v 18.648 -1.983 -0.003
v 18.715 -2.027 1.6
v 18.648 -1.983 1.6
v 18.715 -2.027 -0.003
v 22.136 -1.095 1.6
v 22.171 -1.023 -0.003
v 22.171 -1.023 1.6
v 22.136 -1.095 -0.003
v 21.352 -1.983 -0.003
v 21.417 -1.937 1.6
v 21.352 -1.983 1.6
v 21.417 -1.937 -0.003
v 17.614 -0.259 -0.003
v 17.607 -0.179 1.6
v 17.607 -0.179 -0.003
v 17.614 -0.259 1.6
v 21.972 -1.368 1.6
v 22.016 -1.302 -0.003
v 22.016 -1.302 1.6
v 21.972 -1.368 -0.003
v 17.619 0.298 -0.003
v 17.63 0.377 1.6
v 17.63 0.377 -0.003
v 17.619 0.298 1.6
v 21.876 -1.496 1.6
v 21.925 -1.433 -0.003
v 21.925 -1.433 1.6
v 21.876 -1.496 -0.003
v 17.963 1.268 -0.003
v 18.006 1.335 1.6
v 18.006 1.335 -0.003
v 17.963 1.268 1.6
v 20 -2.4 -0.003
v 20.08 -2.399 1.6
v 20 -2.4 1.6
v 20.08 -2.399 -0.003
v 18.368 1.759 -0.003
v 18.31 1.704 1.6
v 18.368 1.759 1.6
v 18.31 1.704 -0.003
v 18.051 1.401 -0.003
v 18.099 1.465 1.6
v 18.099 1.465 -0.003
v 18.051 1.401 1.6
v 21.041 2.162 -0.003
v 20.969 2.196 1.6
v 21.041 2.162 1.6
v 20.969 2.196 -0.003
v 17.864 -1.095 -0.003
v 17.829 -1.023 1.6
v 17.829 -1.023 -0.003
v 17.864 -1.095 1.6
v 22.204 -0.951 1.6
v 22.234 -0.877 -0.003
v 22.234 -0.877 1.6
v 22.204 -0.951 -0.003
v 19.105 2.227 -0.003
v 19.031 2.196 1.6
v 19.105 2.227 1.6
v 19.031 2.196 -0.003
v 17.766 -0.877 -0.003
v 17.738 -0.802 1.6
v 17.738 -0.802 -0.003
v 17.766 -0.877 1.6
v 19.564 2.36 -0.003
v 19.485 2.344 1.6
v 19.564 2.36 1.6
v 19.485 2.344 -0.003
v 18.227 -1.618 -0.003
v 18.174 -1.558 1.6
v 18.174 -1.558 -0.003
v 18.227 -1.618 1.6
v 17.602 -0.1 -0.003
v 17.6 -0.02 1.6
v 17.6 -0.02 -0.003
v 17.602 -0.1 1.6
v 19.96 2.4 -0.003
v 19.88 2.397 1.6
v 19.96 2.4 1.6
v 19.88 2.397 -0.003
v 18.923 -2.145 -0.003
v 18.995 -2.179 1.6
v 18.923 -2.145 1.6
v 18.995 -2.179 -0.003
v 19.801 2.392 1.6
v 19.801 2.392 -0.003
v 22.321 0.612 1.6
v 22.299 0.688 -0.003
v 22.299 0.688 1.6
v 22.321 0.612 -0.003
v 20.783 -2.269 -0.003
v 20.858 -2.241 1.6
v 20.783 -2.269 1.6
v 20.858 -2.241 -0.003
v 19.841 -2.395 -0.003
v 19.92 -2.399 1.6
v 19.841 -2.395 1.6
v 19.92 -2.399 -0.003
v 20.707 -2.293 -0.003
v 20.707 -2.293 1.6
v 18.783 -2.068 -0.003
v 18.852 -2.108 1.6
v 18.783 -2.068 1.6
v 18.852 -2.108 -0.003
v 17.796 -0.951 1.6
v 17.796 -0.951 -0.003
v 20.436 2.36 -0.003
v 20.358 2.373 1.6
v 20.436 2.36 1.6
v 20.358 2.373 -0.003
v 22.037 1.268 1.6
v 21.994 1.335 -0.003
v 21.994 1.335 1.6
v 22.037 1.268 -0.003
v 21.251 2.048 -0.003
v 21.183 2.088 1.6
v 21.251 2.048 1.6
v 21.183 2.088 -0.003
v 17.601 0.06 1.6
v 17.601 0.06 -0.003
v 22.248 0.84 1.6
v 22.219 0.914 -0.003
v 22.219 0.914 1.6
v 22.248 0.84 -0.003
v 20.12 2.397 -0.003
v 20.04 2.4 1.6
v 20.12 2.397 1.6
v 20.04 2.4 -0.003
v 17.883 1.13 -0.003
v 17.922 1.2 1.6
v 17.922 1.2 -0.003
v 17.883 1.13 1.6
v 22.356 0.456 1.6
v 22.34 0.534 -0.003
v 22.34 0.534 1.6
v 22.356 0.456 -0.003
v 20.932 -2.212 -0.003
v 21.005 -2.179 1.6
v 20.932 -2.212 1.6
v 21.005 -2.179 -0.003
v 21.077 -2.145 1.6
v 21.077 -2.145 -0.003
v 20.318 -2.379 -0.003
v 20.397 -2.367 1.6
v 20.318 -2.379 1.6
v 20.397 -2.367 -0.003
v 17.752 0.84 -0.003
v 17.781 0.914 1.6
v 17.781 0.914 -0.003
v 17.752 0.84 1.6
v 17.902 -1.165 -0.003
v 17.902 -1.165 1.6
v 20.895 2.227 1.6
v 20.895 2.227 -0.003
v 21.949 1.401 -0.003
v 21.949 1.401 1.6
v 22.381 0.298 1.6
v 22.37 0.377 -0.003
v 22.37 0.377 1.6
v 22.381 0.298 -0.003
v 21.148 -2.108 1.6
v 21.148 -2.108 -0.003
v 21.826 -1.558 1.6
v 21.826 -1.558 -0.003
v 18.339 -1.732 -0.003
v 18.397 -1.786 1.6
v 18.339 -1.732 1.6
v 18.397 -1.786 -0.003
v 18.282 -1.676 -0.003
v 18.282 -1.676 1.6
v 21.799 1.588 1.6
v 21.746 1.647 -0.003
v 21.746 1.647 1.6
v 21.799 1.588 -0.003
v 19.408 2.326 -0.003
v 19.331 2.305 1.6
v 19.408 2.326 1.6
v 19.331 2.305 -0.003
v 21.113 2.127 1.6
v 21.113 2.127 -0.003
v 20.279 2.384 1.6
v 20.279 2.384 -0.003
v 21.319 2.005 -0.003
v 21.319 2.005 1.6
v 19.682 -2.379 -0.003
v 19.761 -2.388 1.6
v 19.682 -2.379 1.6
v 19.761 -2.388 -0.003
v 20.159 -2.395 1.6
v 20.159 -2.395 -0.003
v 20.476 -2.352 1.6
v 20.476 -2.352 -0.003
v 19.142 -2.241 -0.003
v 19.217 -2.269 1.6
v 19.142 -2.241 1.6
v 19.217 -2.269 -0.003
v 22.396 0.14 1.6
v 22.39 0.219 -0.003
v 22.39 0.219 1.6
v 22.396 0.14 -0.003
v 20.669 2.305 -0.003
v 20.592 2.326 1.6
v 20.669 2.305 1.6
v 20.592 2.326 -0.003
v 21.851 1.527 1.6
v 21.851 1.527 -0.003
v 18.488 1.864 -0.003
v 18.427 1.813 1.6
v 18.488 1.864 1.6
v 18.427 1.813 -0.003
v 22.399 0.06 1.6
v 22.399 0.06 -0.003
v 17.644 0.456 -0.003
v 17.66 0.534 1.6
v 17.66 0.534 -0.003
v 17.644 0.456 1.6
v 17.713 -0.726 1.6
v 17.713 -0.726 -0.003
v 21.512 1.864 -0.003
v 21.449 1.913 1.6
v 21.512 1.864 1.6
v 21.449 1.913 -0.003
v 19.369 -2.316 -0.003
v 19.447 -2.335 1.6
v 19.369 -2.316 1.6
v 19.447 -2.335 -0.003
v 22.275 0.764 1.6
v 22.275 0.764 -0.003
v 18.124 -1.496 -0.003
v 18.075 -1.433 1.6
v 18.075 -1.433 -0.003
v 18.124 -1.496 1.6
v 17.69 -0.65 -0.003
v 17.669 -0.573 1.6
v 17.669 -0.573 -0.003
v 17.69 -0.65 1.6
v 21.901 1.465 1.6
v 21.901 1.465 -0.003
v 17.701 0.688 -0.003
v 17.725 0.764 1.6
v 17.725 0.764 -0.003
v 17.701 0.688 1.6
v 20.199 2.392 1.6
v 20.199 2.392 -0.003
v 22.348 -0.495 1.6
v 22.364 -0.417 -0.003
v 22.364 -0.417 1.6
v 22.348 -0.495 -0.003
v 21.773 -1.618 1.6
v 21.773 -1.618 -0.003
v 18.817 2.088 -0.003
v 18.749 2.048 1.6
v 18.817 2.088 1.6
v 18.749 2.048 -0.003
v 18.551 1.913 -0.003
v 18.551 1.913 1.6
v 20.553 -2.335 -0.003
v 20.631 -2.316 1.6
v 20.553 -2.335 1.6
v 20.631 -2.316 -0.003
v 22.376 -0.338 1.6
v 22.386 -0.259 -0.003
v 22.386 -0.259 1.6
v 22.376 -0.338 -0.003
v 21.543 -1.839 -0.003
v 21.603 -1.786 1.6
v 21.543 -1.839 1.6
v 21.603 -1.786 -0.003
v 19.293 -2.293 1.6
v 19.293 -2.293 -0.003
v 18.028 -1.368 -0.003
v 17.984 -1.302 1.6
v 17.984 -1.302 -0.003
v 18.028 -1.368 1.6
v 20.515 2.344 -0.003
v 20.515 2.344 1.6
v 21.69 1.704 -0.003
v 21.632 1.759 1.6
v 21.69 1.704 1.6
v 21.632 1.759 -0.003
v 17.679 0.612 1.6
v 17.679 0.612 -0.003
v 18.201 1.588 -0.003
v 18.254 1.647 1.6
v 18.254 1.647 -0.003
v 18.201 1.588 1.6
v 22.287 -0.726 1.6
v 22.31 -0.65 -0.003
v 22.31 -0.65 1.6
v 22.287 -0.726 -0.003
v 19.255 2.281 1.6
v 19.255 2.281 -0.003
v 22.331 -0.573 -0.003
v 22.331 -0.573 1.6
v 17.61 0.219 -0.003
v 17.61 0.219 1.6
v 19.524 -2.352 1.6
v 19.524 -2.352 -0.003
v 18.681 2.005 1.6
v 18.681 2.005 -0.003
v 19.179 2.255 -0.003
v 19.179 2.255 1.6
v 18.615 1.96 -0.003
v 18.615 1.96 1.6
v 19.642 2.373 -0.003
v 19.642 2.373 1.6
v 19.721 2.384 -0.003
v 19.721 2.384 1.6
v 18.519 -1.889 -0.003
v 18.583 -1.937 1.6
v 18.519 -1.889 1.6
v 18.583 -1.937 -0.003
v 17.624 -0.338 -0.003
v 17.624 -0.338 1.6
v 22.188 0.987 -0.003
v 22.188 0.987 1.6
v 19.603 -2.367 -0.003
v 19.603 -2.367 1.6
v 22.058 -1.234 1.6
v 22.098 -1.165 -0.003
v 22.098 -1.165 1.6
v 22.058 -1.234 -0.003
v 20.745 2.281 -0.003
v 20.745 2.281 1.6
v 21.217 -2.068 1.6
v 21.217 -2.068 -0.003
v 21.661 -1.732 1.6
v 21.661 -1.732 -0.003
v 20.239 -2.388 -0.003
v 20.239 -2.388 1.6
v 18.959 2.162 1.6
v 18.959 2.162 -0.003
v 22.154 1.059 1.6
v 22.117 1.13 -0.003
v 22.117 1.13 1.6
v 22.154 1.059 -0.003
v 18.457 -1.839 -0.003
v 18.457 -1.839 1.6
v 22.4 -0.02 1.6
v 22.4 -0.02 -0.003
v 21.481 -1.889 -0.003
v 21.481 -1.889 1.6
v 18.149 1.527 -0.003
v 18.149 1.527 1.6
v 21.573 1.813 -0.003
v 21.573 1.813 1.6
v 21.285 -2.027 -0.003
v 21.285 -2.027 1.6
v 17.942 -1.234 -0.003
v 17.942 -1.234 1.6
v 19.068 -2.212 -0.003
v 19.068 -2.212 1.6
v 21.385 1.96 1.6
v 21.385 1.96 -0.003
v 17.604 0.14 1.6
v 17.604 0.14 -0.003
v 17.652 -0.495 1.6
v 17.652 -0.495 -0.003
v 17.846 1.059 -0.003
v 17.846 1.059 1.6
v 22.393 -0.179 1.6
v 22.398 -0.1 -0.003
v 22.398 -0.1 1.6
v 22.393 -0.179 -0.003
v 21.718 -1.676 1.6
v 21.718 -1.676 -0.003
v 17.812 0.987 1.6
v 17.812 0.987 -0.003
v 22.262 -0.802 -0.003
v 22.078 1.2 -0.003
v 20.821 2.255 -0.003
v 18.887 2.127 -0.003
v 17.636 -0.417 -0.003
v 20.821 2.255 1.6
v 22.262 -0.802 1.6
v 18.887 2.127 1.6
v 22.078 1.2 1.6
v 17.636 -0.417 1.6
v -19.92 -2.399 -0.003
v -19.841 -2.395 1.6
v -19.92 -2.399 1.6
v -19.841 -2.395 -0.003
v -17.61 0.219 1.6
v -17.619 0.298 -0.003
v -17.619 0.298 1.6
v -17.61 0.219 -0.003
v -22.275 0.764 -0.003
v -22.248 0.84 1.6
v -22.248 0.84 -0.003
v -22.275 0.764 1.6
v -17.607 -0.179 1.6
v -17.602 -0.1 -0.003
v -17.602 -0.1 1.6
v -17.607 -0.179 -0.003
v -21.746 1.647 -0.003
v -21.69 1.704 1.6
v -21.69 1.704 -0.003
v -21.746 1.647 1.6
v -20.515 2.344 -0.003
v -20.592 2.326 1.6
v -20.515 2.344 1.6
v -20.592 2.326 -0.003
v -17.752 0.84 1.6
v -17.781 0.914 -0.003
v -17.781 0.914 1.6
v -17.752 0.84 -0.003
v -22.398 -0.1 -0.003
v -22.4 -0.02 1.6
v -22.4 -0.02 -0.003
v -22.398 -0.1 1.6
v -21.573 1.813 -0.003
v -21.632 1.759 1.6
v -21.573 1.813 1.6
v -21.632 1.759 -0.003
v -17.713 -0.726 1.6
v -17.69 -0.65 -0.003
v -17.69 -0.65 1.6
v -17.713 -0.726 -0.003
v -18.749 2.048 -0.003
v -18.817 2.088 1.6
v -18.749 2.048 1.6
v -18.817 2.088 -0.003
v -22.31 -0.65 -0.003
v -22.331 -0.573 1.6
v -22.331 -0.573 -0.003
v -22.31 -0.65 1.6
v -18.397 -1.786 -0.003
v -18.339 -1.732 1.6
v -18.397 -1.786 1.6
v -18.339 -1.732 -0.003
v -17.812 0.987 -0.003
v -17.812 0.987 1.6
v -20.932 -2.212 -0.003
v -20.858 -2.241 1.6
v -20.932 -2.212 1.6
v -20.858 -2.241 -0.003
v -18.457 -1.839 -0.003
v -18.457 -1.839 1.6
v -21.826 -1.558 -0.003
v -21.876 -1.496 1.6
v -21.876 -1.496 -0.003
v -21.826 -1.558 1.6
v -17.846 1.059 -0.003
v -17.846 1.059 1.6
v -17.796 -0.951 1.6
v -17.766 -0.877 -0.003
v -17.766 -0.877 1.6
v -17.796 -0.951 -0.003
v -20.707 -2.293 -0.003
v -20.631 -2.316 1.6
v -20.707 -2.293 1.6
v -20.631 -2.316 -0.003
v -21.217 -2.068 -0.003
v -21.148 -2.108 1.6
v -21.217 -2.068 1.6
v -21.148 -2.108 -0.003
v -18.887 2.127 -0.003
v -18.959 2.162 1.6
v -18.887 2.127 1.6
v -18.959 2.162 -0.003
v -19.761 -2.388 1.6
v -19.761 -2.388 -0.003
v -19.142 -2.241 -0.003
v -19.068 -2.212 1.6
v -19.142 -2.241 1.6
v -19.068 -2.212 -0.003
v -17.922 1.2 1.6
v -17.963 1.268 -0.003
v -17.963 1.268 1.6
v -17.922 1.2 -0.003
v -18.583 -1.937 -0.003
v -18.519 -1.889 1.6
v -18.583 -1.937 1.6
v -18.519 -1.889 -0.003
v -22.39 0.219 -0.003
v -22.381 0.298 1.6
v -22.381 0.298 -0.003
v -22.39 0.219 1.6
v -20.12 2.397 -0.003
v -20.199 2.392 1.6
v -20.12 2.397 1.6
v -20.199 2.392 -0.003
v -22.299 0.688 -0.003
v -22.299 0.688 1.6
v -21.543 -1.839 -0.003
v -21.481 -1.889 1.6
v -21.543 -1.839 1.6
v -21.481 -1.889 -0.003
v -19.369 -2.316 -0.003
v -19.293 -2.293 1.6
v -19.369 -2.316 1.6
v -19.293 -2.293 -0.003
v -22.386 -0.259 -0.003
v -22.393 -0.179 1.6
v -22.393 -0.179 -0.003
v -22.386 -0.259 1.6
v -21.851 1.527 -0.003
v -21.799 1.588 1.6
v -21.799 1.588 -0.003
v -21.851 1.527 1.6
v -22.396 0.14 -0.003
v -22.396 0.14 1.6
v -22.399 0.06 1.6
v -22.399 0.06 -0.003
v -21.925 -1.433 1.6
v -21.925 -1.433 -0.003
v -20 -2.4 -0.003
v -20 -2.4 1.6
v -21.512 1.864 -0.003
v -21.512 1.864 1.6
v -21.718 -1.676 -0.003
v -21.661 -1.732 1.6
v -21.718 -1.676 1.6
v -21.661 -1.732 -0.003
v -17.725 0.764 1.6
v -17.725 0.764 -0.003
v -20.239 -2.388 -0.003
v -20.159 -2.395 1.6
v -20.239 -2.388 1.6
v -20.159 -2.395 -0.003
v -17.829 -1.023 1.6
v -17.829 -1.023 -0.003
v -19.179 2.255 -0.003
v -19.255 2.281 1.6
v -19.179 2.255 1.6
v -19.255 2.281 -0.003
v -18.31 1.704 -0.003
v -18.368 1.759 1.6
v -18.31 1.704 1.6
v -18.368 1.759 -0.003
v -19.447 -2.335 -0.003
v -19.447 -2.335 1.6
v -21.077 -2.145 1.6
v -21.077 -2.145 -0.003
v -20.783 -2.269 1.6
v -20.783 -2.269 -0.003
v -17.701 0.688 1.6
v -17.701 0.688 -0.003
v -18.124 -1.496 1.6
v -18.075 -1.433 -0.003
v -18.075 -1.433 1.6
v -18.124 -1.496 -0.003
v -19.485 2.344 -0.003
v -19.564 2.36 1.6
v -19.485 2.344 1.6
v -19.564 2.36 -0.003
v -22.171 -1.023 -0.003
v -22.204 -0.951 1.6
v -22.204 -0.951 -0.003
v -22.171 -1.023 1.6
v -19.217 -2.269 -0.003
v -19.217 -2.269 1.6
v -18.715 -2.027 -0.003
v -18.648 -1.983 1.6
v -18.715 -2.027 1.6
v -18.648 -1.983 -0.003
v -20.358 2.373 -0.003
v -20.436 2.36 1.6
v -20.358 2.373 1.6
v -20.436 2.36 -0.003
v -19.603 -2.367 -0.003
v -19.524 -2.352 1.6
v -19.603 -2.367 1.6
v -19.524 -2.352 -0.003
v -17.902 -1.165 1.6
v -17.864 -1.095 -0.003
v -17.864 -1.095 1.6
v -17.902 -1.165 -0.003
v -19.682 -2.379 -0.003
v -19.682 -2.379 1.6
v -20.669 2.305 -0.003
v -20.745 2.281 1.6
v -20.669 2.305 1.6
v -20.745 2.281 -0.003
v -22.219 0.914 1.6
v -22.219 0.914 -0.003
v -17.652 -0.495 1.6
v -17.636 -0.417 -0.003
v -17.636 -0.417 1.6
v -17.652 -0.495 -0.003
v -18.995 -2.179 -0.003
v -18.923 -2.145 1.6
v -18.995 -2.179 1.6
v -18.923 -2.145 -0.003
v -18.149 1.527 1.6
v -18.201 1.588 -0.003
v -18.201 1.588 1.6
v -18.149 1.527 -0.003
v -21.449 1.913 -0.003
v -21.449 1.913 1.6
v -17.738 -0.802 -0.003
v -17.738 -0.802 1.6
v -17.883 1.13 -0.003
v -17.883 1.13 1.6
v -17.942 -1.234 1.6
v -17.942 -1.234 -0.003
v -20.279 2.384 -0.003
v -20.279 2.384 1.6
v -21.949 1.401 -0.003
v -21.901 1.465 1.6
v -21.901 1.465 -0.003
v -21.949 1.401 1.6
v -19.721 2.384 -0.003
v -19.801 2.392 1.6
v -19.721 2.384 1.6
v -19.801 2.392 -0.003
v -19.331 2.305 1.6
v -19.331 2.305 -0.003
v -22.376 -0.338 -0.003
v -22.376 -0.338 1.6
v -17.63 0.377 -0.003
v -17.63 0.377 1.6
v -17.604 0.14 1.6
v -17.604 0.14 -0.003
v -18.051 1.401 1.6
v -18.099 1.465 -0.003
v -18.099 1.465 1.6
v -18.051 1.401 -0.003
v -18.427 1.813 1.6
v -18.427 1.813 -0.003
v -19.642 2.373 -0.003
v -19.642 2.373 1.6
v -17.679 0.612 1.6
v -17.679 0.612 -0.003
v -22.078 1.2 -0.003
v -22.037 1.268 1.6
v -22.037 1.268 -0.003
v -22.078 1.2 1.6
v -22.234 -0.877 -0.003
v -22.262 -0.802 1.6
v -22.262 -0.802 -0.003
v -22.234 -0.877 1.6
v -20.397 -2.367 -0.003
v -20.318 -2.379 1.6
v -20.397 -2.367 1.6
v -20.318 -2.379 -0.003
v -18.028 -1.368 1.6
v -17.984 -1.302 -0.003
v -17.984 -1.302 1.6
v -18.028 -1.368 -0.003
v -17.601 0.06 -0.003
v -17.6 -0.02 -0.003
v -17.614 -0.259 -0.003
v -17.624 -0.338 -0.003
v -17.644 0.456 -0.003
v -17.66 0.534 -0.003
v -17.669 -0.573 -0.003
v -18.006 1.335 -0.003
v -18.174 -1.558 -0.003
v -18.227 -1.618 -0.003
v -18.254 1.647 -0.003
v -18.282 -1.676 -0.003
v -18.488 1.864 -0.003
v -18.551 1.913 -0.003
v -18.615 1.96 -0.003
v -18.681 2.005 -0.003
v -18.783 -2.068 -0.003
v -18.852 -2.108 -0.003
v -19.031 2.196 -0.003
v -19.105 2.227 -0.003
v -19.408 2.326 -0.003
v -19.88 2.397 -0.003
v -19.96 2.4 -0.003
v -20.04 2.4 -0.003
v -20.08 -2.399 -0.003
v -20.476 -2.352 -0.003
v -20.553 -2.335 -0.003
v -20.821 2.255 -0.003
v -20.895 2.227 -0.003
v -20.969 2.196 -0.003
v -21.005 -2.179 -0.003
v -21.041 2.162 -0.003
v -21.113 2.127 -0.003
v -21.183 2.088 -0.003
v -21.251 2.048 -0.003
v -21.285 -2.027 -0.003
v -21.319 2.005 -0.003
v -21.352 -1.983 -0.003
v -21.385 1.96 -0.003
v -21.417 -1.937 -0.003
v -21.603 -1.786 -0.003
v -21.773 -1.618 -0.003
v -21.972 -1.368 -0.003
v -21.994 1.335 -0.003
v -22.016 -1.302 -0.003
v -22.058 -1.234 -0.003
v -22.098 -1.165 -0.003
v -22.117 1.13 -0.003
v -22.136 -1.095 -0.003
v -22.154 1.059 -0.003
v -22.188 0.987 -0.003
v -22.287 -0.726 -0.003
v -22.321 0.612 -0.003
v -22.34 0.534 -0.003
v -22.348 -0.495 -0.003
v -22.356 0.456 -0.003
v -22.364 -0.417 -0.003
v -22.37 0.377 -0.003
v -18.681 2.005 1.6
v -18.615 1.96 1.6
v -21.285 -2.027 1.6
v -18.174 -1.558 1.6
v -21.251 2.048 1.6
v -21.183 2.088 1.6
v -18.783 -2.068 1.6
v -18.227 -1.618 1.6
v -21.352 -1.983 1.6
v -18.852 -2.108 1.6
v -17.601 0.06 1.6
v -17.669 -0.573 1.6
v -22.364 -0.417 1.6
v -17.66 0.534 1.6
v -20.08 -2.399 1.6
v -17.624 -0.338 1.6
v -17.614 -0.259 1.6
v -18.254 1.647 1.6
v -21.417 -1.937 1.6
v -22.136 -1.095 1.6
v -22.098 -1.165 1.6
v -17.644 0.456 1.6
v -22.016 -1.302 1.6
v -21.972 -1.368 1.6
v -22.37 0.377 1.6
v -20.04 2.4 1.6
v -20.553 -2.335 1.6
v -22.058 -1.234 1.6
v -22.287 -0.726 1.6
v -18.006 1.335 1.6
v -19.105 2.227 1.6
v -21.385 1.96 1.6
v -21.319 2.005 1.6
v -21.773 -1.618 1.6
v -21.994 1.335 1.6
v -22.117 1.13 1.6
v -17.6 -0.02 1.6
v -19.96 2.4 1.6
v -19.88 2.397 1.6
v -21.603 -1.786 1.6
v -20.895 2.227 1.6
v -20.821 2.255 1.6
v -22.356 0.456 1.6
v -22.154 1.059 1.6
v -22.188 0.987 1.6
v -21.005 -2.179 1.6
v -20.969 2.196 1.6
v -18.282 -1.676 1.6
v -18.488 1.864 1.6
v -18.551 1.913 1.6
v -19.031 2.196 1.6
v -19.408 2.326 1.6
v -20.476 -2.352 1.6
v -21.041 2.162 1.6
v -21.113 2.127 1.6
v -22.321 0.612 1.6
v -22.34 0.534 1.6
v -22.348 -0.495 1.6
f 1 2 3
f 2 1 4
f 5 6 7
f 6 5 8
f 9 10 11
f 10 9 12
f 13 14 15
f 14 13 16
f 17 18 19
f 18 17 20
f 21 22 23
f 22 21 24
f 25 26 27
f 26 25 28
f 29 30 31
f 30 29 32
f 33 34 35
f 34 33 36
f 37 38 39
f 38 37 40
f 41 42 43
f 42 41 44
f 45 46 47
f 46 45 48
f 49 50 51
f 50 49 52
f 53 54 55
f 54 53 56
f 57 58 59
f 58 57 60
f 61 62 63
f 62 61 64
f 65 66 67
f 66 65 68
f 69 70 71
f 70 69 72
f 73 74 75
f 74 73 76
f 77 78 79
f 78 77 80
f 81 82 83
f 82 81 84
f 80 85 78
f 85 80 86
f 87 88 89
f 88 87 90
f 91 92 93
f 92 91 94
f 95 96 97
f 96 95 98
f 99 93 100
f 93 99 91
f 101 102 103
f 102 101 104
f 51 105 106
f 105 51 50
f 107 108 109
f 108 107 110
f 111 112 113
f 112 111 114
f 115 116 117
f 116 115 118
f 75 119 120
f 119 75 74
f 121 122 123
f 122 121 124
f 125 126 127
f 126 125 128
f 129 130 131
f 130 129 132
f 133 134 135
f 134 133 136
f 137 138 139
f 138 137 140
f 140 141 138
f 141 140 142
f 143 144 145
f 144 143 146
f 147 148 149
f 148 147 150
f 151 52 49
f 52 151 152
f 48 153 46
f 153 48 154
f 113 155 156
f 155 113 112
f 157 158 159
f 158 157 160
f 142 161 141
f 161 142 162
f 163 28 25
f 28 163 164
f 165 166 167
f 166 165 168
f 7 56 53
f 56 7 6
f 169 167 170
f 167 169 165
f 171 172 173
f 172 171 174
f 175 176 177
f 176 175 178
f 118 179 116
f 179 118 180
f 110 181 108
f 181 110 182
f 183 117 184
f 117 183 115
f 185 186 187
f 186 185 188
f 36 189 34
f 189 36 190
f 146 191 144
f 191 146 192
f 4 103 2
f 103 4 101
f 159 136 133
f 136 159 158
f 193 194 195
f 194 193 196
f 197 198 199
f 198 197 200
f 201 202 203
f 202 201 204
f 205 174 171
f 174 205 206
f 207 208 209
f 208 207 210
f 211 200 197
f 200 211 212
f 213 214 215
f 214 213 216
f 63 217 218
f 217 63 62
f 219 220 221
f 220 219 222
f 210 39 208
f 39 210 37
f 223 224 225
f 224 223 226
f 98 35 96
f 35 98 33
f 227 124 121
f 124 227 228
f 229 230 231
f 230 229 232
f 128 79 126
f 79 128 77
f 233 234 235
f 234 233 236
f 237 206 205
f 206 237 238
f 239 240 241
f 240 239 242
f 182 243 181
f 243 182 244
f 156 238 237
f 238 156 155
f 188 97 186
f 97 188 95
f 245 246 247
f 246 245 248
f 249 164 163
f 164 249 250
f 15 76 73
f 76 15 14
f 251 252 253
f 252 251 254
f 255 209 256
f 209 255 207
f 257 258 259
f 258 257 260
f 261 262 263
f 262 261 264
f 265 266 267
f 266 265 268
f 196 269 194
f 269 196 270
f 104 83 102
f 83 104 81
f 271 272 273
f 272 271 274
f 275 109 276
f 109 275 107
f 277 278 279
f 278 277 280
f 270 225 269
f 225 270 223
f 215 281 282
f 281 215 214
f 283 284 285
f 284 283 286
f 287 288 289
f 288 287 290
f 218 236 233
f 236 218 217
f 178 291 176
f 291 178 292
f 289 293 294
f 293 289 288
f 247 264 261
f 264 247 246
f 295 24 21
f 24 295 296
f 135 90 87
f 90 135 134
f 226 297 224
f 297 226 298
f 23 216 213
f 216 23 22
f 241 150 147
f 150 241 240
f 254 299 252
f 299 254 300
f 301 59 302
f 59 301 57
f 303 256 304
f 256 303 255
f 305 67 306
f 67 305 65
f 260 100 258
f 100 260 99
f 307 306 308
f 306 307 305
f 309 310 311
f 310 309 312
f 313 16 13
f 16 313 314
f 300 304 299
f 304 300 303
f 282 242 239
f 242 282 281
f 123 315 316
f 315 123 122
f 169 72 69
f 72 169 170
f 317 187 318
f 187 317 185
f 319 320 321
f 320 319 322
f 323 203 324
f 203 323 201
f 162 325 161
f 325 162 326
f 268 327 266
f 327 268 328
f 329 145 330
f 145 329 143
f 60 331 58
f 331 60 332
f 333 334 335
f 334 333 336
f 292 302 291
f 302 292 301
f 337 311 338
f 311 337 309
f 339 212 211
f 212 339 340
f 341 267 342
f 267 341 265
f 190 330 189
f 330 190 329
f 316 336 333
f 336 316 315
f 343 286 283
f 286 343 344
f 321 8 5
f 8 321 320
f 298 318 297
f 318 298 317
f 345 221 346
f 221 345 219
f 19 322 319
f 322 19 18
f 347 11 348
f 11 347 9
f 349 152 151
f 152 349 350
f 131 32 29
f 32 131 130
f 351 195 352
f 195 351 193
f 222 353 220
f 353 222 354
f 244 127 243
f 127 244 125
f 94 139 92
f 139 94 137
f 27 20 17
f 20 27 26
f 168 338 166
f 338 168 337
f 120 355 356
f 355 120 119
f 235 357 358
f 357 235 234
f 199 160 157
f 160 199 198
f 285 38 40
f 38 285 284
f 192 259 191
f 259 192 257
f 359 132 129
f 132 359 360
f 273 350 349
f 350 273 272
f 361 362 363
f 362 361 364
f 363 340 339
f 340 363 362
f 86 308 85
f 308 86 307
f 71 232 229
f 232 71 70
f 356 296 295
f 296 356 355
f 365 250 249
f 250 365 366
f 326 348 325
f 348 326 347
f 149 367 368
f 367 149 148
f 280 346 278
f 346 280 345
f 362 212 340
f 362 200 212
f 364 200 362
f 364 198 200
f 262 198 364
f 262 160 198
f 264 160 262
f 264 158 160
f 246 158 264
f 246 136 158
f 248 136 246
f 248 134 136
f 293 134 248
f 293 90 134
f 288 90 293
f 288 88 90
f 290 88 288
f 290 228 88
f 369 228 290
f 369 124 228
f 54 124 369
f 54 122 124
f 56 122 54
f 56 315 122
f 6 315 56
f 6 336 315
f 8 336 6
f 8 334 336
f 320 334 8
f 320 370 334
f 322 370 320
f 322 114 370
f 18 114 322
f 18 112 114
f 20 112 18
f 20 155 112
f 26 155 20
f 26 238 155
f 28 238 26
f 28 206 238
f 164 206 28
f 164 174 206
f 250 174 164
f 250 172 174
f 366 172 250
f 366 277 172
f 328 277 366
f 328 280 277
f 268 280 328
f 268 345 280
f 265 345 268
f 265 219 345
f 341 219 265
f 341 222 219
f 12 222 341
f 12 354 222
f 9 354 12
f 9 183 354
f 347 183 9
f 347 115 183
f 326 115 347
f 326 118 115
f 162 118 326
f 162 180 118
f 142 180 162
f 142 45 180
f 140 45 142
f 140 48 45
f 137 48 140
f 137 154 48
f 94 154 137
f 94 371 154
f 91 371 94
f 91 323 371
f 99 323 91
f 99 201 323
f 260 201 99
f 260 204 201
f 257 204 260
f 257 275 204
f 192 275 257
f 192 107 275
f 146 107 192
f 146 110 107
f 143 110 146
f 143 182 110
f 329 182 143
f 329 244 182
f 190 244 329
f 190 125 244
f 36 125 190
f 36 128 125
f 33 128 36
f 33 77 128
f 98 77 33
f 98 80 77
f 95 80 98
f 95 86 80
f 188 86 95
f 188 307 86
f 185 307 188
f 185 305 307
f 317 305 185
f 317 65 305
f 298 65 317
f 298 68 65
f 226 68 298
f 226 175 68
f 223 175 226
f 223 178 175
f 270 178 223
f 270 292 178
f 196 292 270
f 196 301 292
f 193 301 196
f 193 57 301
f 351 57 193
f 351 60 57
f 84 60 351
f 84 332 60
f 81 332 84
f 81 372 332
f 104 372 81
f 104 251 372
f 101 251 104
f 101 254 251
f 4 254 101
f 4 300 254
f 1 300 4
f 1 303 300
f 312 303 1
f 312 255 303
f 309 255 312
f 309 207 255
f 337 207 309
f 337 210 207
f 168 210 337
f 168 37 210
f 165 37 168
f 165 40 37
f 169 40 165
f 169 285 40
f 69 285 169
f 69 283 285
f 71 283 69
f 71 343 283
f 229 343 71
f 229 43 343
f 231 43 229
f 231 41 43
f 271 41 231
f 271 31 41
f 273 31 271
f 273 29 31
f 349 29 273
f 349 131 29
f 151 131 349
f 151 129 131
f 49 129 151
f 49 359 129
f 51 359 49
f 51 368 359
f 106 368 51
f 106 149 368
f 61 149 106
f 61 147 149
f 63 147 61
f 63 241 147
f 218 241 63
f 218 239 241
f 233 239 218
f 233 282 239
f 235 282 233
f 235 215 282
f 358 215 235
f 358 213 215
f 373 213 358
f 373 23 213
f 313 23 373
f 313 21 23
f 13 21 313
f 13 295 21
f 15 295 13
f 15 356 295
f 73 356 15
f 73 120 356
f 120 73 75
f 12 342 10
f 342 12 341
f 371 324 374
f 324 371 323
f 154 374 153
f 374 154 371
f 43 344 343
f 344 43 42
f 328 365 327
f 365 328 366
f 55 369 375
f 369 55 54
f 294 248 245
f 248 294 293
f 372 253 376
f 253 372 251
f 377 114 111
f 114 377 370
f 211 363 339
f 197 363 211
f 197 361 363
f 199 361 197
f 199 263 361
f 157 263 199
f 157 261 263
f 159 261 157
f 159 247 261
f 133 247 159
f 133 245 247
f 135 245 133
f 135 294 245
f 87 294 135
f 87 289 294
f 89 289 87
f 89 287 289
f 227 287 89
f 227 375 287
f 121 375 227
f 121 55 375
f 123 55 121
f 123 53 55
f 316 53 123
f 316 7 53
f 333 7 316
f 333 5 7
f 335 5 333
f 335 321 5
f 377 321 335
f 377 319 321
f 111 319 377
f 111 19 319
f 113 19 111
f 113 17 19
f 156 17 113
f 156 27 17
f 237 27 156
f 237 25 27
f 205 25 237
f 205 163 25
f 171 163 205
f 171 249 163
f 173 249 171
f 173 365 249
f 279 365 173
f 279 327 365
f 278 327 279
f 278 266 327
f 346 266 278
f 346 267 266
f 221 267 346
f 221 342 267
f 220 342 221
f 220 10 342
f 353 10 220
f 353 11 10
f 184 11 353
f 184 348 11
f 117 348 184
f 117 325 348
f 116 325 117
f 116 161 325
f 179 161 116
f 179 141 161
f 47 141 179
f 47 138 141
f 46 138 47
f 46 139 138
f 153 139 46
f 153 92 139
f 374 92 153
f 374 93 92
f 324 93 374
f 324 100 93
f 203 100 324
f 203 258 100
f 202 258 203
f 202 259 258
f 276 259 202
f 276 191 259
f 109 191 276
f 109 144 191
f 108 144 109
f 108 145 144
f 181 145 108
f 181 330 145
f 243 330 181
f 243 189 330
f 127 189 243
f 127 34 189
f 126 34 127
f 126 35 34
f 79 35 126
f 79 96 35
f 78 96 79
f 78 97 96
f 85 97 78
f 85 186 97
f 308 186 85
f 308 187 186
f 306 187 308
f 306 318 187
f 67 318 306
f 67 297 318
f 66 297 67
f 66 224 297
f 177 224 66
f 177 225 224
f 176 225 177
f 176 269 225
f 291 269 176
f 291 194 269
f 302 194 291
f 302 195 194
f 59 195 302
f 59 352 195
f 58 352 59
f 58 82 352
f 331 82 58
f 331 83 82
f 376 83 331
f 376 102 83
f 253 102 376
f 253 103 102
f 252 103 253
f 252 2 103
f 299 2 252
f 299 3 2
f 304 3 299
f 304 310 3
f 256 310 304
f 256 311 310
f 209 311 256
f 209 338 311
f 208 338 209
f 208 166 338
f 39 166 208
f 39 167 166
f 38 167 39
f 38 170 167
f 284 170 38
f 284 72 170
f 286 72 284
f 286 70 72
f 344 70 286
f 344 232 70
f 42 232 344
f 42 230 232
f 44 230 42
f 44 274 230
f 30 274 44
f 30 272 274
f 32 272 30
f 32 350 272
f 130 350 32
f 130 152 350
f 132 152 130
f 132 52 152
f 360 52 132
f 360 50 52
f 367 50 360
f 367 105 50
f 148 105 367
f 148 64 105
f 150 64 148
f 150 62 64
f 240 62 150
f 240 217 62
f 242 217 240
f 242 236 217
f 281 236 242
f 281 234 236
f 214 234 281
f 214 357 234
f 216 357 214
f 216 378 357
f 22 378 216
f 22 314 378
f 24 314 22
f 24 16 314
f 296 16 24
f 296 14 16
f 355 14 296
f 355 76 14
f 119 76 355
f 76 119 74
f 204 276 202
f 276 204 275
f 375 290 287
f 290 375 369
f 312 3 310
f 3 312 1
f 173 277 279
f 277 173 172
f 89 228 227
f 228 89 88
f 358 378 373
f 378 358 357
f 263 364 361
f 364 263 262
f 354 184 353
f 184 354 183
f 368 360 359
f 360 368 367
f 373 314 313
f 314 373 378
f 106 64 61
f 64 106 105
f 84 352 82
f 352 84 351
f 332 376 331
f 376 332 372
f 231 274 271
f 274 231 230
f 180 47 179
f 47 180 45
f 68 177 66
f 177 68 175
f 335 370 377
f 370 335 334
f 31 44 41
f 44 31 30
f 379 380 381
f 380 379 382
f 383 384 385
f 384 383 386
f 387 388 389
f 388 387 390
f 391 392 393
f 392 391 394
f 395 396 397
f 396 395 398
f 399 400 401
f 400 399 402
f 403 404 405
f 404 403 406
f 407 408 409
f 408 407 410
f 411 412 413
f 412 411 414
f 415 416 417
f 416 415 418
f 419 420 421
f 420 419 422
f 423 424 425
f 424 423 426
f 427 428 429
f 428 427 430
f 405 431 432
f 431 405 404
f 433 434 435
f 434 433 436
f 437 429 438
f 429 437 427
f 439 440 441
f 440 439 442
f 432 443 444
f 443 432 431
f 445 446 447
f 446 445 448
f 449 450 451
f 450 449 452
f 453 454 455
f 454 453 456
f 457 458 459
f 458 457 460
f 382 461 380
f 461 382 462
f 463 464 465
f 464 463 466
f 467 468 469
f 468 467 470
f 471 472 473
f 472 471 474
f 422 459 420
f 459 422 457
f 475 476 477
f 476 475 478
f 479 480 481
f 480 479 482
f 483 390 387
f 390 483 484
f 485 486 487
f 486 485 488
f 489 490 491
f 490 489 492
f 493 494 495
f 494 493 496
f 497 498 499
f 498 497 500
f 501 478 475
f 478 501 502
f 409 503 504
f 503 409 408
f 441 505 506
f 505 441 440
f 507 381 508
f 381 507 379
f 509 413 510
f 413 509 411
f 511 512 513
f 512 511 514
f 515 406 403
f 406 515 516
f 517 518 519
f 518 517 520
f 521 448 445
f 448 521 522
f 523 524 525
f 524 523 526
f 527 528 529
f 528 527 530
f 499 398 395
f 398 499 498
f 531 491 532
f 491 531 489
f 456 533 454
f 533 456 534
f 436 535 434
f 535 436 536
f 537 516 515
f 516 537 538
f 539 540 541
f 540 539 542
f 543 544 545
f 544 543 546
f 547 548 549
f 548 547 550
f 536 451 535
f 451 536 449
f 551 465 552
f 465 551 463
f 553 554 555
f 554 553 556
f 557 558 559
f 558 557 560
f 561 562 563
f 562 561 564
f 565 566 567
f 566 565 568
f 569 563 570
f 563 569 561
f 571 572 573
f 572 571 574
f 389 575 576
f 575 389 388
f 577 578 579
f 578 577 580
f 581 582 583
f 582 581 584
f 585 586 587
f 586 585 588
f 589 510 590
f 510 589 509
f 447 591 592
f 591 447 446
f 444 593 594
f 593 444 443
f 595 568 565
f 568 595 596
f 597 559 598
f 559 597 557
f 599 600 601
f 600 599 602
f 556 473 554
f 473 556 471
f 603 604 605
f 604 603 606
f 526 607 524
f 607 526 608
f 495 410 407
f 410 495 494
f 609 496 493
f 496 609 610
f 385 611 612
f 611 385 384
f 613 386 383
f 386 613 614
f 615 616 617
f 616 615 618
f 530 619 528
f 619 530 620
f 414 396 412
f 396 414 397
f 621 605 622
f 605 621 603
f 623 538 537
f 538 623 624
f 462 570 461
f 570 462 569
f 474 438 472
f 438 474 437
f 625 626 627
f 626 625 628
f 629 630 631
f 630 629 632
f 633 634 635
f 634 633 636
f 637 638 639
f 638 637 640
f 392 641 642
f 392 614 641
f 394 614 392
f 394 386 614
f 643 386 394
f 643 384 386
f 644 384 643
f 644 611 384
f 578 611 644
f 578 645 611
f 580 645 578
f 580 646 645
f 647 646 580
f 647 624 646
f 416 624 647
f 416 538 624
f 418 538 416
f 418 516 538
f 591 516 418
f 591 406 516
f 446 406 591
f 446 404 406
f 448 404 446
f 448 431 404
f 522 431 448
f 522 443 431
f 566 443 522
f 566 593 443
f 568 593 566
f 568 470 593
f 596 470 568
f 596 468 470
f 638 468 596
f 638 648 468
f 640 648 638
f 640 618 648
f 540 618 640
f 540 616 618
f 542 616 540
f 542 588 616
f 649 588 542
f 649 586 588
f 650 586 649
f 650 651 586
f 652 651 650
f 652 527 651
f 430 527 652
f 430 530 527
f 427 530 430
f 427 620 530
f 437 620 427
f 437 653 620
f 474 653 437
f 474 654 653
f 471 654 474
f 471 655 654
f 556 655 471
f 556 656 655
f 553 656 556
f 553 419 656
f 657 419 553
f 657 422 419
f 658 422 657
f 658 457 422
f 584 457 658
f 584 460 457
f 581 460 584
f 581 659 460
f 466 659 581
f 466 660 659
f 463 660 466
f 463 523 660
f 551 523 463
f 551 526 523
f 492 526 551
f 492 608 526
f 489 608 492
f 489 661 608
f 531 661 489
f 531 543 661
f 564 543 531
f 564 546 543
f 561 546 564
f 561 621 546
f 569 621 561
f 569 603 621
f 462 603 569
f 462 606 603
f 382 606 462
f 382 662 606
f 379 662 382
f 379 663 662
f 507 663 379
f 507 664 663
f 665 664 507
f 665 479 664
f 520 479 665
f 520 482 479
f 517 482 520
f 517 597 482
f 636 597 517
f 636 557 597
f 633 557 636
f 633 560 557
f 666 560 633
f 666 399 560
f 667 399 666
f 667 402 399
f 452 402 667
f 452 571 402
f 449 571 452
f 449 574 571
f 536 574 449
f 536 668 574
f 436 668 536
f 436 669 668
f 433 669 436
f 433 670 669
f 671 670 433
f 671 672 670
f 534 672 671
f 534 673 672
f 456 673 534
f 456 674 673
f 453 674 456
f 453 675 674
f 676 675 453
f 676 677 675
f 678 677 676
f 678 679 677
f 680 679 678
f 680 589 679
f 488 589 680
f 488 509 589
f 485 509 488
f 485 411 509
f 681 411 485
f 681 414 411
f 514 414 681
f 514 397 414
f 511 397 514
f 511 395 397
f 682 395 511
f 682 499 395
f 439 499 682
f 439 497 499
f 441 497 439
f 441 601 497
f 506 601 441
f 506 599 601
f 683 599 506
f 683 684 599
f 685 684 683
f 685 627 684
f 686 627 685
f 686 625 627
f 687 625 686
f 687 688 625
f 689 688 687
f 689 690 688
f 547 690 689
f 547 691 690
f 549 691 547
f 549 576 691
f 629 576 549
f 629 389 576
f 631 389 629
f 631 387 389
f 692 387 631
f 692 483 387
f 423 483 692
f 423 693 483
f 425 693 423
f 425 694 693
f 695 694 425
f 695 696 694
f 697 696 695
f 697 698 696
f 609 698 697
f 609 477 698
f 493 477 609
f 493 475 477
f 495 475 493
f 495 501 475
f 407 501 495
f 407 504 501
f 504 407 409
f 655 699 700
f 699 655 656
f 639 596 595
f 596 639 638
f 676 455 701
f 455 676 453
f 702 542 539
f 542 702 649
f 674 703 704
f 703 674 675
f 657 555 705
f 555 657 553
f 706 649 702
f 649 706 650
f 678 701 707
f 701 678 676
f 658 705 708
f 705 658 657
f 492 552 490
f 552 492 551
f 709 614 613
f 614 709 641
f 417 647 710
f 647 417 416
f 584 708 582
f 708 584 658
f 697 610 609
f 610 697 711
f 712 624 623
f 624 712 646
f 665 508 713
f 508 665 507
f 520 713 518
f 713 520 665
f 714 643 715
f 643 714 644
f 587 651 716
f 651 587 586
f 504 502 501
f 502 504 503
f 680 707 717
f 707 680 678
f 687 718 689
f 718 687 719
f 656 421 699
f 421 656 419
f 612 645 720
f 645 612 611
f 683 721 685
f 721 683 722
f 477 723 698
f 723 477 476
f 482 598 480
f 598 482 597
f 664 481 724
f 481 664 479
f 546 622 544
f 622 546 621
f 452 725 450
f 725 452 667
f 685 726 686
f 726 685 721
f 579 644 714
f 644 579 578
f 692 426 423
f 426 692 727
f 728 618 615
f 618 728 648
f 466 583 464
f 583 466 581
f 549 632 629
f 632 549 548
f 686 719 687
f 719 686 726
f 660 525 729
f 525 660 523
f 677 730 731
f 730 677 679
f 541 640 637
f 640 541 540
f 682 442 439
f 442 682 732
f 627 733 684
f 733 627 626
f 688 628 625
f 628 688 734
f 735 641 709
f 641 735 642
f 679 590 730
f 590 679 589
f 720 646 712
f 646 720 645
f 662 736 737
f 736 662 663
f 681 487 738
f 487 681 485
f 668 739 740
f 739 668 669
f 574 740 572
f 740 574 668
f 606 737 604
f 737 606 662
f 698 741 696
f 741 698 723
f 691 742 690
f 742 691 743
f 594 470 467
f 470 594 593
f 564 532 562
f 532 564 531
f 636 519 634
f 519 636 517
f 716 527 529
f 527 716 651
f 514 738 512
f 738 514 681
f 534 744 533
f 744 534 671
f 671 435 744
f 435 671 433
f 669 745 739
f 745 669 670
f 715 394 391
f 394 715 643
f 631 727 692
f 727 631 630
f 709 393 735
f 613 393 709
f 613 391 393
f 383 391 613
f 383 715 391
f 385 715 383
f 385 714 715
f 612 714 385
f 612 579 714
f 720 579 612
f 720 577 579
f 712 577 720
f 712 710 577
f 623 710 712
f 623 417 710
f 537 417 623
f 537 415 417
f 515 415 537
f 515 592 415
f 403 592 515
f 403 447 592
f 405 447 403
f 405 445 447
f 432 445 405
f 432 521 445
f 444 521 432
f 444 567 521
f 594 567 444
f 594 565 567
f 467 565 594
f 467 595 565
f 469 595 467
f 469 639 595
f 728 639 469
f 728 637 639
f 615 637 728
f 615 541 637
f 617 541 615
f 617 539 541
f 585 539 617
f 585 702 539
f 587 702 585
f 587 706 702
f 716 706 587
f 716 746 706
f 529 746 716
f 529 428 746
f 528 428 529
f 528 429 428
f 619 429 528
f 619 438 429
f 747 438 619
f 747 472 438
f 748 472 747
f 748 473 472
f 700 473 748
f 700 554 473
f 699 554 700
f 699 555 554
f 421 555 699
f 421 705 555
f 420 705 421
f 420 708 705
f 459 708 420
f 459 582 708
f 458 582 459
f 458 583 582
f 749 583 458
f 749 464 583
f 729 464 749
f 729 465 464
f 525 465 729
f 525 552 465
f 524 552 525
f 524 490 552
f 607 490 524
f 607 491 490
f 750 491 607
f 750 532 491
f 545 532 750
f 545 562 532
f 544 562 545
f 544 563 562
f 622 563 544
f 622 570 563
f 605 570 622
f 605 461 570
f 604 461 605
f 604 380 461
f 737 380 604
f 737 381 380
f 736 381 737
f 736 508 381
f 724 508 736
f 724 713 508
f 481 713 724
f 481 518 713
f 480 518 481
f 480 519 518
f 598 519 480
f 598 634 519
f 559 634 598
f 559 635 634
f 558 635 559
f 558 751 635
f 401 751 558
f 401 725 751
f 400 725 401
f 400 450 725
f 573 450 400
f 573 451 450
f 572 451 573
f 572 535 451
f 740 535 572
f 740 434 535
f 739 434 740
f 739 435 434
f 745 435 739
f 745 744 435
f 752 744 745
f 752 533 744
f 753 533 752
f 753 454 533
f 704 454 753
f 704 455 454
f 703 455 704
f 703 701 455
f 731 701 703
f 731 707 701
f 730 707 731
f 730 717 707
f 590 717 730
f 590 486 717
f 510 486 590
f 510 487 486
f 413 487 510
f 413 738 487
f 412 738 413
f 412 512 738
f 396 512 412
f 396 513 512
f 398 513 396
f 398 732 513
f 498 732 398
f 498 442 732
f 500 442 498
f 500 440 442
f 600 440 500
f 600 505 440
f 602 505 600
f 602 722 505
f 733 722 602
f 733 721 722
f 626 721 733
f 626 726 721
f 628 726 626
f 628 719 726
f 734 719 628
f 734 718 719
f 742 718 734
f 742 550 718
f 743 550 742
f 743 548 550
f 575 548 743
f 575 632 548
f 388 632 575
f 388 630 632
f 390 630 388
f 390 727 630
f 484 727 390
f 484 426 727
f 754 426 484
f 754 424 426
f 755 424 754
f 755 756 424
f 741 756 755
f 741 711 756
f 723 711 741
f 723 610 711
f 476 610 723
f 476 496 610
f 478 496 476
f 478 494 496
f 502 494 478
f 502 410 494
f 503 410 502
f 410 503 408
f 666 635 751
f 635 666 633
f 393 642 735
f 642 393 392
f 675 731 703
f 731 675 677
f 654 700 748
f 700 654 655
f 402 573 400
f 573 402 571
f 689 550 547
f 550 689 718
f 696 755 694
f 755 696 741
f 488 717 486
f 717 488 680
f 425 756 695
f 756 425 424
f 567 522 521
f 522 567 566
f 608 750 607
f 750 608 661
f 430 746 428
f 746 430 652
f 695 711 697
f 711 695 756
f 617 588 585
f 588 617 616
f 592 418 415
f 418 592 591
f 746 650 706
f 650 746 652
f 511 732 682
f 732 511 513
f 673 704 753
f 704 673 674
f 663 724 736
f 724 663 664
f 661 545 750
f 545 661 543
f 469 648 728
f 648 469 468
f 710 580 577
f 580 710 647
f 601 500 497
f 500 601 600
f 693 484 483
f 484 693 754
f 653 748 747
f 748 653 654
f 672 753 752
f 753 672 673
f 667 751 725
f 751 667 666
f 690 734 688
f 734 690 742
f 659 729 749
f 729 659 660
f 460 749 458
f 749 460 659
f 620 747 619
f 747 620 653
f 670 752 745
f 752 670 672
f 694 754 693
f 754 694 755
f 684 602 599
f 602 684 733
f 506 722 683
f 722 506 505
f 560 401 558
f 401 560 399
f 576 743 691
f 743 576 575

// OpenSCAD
use <../lib.scad>
use <3939.scad>
use <820674b.scad>
$fa=1; $fs=0.2;
function ldraw_lib__3939d01(realsolid=false) = [
// 0 Slope Brick 33  3 x  6 with Coastguard Sticker
// 0 Name: 3939d01.dat
// 0 Author: Takeshi Takahashi [RainbowDolphin]
// 0 !LDRAW_ORG Shortcut UPDATE 2022-05
// 0 !LICENSE Licensed under CC BY 2.0 and CC BY 4.0 : see CAreadme.txt
// 
// 0 BFC CERTIFY CCW
  [0,"BFC","CERTIFY"],
  [0,"BFC","CCW"],
// 
// 0 !KEYWORDS boat, Bricklink 3939pb06, Coastal cutter, Set 6353, ship
// 
// 0 !HISTORY 2022-09-15 [PTadmin] Official Update 2022-05
// 
// 
// 1 16 0 0 0 1 0 0 0 1 0 0 0 1 3939.dat
  [1,16,0,0,0,1,0,0,0,1,0,0,0,1, ldraw_lib__3939(realsolid)],
// 1 16 0 10 -30 -1 0 0 0 .89443 -.44721 0 .44721 .89443 820674b.dat
  [1,16,0,10,-30,-1,0,0,0,.89443,-.44721,0,.44721,.89443, ldraw_lib__820674b(realsolid)],
];
module ldraw_lib__3939d01(step=0, col=false, unit=2/5, alt=false, line=0.2, solid=!$preview)
    makepoly(ldraw_lib__3939d01(solid), step=step, col=col, unit=unit, alt=alt, line=line, solid=solid);
ldraw_lib__3939d01(line=0.2);
